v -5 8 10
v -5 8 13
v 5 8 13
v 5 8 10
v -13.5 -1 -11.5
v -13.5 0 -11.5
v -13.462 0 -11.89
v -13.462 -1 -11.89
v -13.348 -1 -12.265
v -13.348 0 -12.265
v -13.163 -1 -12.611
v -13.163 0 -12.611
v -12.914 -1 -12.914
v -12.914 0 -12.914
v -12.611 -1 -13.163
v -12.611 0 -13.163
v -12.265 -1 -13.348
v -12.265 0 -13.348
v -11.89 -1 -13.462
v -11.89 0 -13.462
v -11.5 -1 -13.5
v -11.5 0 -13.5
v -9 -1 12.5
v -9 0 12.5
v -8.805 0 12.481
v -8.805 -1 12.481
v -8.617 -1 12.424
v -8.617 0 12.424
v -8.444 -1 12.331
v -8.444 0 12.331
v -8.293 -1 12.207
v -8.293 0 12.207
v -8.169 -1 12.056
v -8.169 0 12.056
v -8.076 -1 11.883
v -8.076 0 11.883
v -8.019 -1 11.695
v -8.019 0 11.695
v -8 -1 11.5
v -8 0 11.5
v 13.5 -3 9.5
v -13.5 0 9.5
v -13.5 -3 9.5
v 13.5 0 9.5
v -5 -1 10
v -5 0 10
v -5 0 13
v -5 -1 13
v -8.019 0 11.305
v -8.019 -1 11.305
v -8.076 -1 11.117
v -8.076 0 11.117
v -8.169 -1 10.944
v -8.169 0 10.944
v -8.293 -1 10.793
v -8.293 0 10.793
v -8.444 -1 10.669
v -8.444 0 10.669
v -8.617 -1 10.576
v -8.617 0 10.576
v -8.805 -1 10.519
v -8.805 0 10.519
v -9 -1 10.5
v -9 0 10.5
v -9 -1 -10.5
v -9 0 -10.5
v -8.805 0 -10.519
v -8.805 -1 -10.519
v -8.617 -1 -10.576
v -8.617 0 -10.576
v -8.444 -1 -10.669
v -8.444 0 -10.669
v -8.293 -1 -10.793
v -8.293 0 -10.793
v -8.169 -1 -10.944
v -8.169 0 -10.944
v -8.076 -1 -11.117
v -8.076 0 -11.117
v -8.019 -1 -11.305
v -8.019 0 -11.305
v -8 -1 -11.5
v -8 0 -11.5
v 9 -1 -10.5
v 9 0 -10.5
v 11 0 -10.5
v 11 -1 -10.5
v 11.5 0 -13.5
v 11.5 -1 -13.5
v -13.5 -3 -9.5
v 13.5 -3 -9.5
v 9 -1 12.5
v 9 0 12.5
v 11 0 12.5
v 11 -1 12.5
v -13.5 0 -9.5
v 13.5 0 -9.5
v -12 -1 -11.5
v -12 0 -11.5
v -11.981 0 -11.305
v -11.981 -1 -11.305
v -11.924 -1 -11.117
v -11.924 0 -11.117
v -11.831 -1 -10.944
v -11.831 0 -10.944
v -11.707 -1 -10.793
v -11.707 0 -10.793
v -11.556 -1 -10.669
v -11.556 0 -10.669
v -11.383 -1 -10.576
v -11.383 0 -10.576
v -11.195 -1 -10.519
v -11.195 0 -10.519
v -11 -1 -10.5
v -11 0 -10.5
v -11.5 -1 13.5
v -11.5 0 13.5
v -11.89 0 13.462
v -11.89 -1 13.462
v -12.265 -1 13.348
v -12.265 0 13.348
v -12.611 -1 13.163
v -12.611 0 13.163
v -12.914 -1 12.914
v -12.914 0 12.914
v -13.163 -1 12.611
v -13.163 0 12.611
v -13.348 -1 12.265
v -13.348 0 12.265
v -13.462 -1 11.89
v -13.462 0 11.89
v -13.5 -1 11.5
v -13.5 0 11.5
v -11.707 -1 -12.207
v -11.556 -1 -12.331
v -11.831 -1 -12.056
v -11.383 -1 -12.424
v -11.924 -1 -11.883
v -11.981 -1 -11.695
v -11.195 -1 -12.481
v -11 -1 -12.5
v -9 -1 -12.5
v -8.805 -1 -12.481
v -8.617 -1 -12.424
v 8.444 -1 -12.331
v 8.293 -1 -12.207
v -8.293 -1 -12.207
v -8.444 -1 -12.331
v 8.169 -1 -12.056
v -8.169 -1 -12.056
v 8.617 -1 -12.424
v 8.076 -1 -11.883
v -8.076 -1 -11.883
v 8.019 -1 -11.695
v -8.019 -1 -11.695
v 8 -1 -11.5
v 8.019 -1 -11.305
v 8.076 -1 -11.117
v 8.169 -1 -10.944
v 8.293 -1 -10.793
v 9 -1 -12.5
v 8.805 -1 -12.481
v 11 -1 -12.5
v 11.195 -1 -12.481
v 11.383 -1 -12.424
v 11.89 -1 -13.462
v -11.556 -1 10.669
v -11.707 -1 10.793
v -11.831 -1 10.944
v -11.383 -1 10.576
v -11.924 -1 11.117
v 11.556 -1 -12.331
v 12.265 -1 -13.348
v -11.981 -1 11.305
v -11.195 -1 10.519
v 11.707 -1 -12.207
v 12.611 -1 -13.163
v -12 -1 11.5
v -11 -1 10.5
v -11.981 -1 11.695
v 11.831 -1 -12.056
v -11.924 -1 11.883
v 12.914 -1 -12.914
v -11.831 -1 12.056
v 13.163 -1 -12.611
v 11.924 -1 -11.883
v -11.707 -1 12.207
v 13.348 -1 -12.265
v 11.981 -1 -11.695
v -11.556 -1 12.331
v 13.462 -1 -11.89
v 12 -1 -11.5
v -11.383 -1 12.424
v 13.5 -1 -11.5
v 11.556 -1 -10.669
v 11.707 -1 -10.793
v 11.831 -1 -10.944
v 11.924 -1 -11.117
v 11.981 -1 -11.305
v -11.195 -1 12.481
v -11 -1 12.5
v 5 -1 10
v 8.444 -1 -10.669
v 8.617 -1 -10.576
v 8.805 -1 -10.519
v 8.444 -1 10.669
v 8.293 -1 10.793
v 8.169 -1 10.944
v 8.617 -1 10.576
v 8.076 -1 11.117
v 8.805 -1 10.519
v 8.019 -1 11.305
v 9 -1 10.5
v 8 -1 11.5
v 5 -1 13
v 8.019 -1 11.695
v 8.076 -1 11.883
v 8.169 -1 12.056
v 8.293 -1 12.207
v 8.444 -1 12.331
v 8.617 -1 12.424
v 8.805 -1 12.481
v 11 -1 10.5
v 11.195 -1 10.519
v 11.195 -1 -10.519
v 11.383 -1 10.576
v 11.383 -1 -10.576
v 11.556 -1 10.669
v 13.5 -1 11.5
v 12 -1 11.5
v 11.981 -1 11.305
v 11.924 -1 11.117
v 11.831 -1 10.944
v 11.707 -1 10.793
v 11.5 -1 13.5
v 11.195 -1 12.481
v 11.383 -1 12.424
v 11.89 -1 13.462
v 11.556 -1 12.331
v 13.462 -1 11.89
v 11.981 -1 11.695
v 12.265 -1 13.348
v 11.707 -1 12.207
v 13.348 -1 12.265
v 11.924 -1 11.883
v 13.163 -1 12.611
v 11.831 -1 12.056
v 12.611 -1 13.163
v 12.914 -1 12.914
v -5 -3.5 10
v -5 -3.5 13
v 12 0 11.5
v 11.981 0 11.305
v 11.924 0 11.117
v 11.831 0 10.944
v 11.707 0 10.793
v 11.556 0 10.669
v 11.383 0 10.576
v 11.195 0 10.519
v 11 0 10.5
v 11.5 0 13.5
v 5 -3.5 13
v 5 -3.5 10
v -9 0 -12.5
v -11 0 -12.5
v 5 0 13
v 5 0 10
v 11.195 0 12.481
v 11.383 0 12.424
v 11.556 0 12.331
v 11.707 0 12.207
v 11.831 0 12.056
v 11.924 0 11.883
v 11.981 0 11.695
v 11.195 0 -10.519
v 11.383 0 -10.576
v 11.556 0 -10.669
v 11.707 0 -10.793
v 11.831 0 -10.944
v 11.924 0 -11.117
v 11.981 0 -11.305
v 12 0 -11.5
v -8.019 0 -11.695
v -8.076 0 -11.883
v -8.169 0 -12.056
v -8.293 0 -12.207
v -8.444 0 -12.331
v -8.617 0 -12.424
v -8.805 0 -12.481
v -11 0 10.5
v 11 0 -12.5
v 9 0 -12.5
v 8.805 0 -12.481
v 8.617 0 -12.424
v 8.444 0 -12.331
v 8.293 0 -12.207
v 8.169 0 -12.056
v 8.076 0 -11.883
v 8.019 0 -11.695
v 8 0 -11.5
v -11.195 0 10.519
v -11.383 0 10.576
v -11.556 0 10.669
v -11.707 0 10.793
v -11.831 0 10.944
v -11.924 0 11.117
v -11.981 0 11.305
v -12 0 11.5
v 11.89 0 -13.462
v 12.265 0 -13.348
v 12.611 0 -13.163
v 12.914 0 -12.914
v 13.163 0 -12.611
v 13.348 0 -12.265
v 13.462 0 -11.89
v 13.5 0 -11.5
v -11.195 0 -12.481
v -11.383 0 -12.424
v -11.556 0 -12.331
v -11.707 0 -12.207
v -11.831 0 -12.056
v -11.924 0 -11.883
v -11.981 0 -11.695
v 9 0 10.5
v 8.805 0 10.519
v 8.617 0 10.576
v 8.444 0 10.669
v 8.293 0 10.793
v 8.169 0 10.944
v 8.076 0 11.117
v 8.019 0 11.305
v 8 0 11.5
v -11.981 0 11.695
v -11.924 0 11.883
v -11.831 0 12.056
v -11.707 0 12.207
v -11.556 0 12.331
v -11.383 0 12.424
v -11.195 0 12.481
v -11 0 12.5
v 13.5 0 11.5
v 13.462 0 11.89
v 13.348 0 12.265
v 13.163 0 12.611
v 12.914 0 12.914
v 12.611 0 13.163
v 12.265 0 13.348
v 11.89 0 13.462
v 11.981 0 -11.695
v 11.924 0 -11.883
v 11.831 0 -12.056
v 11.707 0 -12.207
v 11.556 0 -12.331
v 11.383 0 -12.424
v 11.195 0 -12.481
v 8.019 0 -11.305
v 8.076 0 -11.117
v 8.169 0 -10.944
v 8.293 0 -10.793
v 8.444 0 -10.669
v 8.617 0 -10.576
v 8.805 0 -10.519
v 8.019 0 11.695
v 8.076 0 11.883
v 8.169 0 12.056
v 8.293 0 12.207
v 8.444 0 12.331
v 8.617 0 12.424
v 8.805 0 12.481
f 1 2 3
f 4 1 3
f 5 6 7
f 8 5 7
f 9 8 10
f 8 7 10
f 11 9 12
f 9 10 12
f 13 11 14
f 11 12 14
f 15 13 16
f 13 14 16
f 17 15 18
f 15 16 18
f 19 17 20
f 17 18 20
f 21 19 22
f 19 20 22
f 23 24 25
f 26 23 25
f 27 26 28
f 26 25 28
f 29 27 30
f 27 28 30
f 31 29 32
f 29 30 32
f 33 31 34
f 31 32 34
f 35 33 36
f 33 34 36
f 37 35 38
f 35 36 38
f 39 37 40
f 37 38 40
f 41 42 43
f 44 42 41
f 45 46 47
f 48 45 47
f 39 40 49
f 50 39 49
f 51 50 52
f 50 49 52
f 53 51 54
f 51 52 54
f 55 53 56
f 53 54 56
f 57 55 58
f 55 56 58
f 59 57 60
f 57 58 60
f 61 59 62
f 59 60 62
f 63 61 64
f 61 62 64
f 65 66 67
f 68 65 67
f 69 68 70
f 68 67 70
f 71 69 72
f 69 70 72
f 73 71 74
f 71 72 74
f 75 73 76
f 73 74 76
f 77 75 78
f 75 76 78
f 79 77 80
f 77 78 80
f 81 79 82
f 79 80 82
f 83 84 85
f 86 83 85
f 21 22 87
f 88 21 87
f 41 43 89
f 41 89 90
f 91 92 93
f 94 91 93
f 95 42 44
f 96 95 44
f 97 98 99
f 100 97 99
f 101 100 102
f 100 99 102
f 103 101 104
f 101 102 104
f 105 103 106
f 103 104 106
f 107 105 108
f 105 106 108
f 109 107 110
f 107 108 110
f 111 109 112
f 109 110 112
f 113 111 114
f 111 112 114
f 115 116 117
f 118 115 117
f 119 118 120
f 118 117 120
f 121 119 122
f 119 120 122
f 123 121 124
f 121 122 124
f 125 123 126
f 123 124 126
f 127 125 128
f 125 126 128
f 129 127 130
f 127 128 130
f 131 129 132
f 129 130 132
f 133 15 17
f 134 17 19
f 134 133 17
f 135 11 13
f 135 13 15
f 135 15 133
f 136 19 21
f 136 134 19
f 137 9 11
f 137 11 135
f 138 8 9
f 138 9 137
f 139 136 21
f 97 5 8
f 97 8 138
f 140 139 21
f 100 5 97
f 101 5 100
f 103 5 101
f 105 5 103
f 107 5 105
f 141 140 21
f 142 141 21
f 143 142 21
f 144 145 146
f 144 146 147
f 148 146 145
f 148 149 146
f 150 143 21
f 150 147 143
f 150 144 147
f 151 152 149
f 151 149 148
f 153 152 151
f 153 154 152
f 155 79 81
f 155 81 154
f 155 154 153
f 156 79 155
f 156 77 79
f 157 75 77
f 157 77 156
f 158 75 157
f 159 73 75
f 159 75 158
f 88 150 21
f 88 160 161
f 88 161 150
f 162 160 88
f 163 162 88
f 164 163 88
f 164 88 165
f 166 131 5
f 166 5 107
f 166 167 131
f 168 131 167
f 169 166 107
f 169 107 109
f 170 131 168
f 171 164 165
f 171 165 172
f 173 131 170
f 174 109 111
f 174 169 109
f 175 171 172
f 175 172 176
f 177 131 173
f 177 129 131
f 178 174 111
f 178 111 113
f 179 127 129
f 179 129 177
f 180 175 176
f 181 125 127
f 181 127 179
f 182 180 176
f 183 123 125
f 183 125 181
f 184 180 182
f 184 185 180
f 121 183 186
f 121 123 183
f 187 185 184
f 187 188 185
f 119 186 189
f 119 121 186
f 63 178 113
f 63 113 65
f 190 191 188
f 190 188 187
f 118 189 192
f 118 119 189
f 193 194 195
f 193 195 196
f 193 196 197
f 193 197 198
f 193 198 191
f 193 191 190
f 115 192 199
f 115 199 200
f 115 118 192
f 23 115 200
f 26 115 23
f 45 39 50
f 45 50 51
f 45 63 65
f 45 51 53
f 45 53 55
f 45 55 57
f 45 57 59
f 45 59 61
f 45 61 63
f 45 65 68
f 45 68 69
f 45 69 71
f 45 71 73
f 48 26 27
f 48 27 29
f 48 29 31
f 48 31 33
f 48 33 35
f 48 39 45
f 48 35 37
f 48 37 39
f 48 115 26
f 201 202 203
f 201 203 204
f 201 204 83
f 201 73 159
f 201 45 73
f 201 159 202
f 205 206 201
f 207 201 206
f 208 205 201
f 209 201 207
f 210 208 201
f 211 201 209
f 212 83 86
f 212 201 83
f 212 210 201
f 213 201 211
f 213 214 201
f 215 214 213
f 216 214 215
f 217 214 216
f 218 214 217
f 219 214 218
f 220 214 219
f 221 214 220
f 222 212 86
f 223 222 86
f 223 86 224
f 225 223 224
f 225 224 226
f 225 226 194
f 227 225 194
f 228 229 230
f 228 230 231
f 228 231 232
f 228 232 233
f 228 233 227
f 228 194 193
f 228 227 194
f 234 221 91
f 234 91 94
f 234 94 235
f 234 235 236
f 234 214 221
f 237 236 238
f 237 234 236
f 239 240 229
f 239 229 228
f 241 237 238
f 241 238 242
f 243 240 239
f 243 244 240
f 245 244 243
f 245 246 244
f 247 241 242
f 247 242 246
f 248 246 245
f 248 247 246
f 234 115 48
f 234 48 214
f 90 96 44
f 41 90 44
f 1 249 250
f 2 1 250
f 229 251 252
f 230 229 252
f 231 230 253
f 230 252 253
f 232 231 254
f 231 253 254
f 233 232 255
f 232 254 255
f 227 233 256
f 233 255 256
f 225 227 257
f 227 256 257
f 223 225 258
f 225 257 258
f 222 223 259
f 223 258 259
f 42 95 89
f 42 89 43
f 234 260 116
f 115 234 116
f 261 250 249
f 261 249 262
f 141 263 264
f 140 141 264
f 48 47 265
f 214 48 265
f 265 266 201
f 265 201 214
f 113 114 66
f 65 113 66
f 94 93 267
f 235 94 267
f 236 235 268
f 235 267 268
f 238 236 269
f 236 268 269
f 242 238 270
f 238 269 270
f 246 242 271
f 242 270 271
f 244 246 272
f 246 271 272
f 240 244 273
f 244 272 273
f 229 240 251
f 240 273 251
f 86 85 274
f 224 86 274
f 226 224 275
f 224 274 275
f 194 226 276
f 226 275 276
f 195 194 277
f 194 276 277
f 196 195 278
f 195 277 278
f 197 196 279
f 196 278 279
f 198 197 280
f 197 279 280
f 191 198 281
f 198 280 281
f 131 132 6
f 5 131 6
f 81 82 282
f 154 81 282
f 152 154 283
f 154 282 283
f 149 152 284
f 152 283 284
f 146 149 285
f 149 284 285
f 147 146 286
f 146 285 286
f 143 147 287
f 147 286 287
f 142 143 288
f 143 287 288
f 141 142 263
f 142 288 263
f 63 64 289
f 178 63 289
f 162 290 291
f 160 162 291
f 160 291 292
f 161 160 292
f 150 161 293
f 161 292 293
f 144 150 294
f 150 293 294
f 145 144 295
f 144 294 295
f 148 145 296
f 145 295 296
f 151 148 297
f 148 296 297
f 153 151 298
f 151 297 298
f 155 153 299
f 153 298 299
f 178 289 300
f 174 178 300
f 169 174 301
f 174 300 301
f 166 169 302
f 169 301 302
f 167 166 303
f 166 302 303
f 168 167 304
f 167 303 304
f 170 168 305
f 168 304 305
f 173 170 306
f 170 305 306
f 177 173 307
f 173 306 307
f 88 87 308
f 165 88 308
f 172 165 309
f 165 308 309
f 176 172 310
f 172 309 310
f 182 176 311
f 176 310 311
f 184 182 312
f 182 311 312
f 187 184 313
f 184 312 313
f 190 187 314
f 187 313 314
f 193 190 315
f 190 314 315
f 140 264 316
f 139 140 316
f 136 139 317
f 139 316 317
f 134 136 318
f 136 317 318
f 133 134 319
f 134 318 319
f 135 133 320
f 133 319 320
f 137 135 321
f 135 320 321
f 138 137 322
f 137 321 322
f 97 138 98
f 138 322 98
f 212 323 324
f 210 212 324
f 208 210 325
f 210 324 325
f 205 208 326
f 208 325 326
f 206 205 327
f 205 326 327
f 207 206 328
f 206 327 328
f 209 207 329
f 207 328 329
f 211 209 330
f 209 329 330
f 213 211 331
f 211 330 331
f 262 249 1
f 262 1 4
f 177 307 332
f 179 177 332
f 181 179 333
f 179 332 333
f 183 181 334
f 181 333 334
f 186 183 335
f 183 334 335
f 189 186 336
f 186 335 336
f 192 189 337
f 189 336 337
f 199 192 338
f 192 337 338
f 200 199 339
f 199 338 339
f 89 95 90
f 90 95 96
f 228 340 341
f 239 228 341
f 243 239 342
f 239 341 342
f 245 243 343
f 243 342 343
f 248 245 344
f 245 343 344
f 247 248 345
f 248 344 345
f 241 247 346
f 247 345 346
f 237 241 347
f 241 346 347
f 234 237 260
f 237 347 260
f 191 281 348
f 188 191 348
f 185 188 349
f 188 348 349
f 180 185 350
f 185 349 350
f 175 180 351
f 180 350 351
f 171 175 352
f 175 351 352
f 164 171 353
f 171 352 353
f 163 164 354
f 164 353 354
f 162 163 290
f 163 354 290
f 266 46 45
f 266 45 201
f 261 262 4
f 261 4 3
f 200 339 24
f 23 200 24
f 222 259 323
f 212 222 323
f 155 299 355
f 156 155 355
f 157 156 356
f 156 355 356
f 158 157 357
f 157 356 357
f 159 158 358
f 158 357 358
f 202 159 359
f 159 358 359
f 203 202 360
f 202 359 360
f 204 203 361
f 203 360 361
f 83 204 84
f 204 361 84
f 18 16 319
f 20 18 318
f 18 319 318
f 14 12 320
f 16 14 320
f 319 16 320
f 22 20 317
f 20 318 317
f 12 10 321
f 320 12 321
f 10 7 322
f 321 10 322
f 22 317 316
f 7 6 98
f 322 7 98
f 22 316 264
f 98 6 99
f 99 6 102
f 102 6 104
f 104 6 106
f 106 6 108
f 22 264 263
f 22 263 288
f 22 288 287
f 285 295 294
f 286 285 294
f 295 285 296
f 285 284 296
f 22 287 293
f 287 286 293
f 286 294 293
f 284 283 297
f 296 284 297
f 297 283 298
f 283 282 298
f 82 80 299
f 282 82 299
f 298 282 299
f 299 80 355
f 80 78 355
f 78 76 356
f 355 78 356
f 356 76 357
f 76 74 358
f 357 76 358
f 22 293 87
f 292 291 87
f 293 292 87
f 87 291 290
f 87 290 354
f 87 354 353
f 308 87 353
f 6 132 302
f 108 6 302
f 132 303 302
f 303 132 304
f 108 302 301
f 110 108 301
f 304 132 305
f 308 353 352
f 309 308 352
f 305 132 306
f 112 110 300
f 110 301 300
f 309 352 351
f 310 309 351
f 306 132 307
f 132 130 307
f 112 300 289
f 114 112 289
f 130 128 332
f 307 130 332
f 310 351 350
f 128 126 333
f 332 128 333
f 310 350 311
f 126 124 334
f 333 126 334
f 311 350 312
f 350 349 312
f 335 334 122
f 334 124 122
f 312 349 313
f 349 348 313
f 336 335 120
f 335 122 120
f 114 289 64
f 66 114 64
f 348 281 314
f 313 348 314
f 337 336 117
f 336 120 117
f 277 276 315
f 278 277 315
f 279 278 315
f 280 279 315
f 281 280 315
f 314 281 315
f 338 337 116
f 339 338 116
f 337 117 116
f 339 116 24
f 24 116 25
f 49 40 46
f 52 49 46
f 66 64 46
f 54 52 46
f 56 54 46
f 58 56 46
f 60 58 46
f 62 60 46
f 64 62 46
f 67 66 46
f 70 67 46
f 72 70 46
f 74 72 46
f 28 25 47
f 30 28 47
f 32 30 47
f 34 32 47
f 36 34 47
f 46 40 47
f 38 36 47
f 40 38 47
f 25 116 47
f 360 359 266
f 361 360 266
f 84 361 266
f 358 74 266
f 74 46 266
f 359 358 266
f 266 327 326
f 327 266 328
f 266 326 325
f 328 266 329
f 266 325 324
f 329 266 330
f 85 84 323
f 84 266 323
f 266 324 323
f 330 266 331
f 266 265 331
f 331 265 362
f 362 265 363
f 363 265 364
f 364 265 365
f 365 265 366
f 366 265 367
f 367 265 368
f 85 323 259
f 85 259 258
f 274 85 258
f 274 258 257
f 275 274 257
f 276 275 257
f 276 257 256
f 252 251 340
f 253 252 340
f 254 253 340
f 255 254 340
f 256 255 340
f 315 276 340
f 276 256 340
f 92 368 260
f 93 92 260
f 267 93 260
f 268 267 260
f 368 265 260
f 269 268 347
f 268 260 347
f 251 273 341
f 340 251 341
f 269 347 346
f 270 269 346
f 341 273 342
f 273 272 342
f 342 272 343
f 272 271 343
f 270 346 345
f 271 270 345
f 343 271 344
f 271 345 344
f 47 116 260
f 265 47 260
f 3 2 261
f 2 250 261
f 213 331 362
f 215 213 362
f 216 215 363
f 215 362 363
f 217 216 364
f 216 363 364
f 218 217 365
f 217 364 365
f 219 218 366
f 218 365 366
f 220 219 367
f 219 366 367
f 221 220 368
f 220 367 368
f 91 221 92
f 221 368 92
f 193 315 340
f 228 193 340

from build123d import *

# Parameters (mm, degrees)
F0_W          = 10
F0_H          = 3
F0_W_2        = 27
F0_H_2        = 19
F1_DEPTH      = 1
F2_DEPTH      = 3
F3_DEPTH      = 3.5
F3_DEPTH_BACK = 8


with BuildPart() as f1:
    # F0 (on Front) → F1 (new body)
    with BuildSketch(Plane.XZ):
        with BuildLine():
            Line((-13.5, 9.5), (13.5, 9.5))
            Line((13.5, 9.5), (13.5, 11.5))
            ThreePointArc((13.5, 11.5), (12.914214, 12.914214), (11.5, 13.5))
            Line((11.5, 13.5), (-11.5, 13.5))
            ThreePointArc((-11.5, 13.5), (-12.914214, 12.914214), (-13.5, 11.5))
            Line((-13.5, 11.5), (-13.5, 9.5))
        make_face()
        with BuildLine():
            ThreePointArc((-8, 11.5), (-8.292893, 10.792893), (-9, 10.5))
            Line((-9, 10.5), (-11, 10.5))
            ThreePointArc((-11, 10.5), (-11.707107, 10.792893), (-12, 11.5))
            ThreePointArc((-12, 11.5), (-11.707107, 12.207107), (-11, 12.5))
            Line((-11, 12.5), (-9, 12.5))
            ThreePointArc((-9, 12.5), (-8.292893, 12.207107), (-8, 11.5))
        make_face(mode=Mode.SUBTRACT)
        with Locations((0, 11.5)):
            Rectangle(F0_W, F0_H, mode=Mode.SUBTRACT)
        with BuildLine():
            ThreePointArc((9, 10.5), (8.292893, 10.792893), (8, 11.5))
            ThreePointArc((8, 11.5), (8.292893, 12.207107), (9, 12.5))
            Line((9, 12.5), (11, 12.5))
            ThreePointArc((11, 12.5), (11.707107, 12.207107), (12, 11.5))
            ThreePointArc((12, 11.5), (11.707107, 10.792893), (11, 10.5))
            Line((11, 10.5), (9, 10.5))
        make_face(mode=Mode.SUBTRACT)
        Rectangle(F0_W_2, F0_H_2)
        with BuildLine():
            Line((-11.5, -13.5), (11.5, -13.5))
            ThreePointArc((11.5, -13.5), (12.914214, -12.914214), (13.5, -11.5))
            Line((13.5, -11.5), (13.5, -9.5))
            Line((13.5, -9.5), (-13.5, -9.5))
            Line((-13.5, -9.5), (-13.5, -11.5))
            ThreePointArc((-13.5, -11.5), (-12.914214, -12.914214), (-11.5, -13.5))
        make_face()
        with BuildLine():
            ThreePointArc((-11, -12.5), (-11.707107, -12.207107), (-12, -11.5))
            ThreePointArc((-12, -11.5), (-11.707107, -10.792893), (-11, -10.5))
            Line((-11, -10.5), (-9, -10.5))
            ThreePointArc((-9, -10.5), (-8.292893, -10.792893), (-8, -11.5))
            ThreePointArc((-8, -11.5), (-8.292893, -12.207107), (-9, -12.5))
            Line((-9, -12.5), (-11, -12.5))
        make_face(mode=Mode.SUBTRACT)
        with BuildLine():
            ThreePointArc((12, -11.5), (11.707107, -12.207107), (11, -12.5))
            Line((11, -12.5), (9, -12.5))
            ThreePointArc((9, -12.5), (8.292893, -12.207107), (8, -11.5))
            ThreePointArc((8, -11.5), (8.292893, -10.792893), (9, -10.5))
            Line((9, -10.5), (11, -10.5))
            ThreePointArc((11, -10.5), (11.707107, -10.792893), (12, -11.5))
        make_face(mode=Mode.SUBTRACT)
    extrude(amount=F1_DEPTH)


with BuildPart() as f2:
    # F0 (on Front) → F2 (new body)
    with BuildSketch(Plane.XZ):
        Rectangle(F0_W_2, F0_H_2)
    extrude(amount=F2_DEPTH)


with BuildPart() as f3:
    # F0 (on Front) → F3 (new body, two sides)
    with BuildSketch(Plane.XZ) as f3_sk:
        with Locations((0, 11.5)):
            Rectangle(F0_W, F0_H)
    extrude(amount=F3_DEPTH)
    extrude(f3_sk.sketch, amount=-F3_DEPTH_BACK)


solid = Compound([f1.part, f2.part, f3.part])
